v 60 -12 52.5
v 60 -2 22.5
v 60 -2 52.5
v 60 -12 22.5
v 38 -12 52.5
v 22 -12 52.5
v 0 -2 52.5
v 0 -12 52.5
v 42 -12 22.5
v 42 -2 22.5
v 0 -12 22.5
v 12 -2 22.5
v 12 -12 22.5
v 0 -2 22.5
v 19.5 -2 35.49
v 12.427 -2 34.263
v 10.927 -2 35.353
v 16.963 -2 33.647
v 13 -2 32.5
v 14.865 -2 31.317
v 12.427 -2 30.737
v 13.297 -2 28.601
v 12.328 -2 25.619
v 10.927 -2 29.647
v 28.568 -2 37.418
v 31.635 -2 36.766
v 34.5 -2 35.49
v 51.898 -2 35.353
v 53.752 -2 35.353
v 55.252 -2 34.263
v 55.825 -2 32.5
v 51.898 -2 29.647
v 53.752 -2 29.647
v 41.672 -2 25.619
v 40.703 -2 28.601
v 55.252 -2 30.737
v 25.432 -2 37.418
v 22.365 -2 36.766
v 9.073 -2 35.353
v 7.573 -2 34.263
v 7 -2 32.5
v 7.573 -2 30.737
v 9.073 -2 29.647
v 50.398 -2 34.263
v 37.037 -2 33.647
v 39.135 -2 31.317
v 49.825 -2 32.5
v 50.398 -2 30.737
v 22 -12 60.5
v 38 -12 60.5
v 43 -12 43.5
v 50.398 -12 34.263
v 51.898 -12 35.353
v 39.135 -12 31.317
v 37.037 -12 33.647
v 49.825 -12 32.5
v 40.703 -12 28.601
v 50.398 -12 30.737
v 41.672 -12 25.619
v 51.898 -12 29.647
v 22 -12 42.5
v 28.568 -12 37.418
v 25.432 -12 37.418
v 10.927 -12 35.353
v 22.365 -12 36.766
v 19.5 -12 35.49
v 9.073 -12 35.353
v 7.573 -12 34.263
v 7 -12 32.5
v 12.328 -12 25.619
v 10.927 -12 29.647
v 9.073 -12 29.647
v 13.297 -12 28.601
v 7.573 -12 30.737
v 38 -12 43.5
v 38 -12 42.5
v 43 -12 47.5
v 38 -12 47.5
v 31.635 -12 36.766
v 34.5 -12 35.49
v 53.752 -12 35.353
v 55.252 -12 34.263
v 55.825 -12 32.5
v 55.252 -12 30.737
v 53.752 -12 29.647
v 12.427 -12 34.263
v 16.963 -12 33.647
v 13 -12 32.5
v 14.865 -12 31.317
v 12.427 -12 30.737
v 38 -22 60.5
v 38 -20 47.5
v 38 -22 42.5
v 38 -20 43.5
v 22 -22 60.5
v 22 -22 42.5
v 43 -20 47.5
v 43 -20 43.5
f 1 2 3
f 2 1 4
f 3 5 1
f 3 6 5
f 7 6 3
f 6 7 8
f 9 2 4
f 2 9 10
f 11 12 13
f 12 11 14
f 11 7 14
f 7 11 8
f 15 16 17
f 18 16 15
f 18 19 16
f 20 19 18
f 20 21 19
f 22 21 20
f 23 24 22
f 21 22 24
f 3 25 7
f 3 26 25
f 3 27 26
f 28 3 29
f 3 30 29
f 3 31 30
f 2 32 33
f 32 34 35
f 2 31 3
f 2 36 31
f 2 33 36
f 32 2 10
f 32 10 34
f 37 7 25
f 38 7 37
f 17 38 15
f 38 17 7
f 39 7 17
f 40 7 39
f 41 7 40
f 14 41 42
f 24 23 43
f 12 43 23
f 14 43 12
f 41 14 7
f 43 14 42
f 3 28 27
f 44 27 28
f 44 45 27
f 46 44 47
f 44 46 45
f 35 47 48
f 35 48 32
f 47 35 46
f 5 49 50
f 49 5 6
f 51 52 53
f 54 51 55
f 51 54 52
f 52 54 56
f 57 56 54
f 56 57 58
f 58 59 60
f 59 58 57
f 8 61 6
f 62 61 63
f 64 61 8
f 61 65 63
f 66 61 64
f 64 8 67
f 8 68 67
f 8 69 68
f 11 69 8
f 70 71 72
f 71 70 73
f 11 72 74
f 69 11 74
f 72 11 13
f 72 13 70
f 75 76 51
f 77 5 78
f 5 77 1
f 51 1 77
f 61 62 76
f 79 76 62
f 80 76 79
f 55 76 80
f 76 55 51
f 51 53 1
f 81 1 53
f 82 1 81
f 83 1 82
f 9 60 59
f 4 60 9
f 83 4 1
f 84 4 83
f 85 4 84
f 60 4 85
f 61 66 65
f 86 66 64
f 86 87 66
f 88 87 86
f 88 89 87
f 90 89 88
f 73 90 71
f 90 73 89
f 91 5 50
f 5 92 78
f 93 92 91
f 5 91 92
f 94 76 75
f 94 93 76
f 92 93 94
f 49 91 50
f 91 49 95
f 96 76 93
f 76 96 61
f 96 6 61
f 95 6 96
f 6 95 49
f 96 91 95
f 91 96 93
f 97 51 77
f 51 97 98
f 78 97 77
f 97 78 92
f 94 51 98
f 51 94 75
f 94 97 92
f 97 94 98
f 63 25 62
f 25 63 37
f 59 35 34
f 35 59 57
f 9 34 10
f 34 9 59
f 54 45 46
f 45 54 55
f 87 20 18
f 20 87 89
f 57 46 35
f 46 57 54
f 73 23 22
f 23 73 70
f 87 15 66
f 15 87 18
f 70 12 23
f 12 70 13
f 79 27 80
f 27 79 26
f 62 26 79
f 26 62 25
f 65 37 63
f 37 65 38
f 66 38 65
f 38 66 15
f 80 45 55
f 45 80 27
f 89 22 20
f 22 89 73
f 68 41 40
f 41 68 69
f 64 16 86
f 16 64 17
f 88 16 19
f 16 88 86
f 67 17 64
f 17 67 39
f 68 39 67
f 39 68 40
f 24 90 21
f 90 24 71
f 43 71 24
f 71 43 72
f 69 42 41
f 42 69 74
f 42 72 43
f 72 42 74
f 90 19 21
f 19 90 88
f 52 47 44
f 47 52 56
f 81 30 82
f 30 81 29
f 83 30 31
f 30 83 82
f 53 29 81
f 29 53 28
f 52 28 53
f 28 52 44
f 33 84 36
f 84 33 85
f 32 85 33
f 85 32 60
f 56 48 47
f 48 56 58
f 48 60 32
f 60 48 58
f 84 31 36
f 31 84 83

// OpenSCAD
// Smartrap 2.0
// author : serge vieillescaze - smartfriendz
// version 1.9 - 12/09/2014

//variabless
plate_height = 7; // height of all plates
border = 5; // borders around holes for plates
rods_r = 3; // the radius of rods. we use diam 8 but ready to use d=6
M4_bool_r = 2.1; // we can adjust the diam of holes for different printers
bearing_holder_r = 7.5; // the holes for bearings on plates
bearing_holder_l = 24;
space_bet_holders = 10;
filament_r = 0.875; // 1,75  ready for 3mm
nema = 17; // used everywehere to change plate sizes 
linear_system = "fishing_line"; // future option for belt, fishing,printed rail
space_holes_electronics = 84; // adapt to different controlers. 
zrods_spaceX = 72.88;
yrods_spaceY = 62.04;
xrods_spaceX = 42.825;

// ---------  MAIN **************************************

//all();

// testing
//jhead_arm();

//xend_jhead();
translate([0,-12,22.5])
//jhead_arm();

xend_jhead_proxy();


//plate_1();

// draw all
module all(){
	base_center();
	translate([0,-50,0])
	base_y();
	translate([0,-30,45])
	plate_base();
	translate([20,-50,nema_size()[2]])
	plate_y();
	translate([0,50,100])
	plate_x();
	translate([0,0,100])
	xend_jhead();
}


module plate_1(){
	translate([0,0,0]) rotate([-90,0,0])
	xend_jhead();
	translate([90,0,0]) rotate([-90,0,0])
	jhead_arm();

}

// parts  ****************************************************




module bottom()
	difference(){		
		miniround([100,24,plate_height],2);
	translate([10,-10,-1]) 
		cube([80,25,10]); 
	translate([20,20,-1]) 
		cube([nema_size.x,10,10]);
	translate([15,28,4]) rotate([90,0,0])
		cylinder(h=20,r=M4_bool_r);
	translate([65,28,4]) rotate([90,0,0])
		cylinder(h=20,r=M4_bool_r);
	}
		


// plate base   ---------------------------------------------

module plate_base()
	difference(){
	miniround([100,60,plate_height],2);
	
	translate([10,20,(bearing_holder_r*2)-2]) 
	rotate([0,90,0])
		cylinder(h=bearing_holder_l,r=bearing_holder_r);
	translate([bearing_holder_l+space_bet_holders*2,20,(bearing_holder_r*2)-2]) 
	rotate([0,90,0])
		cylinder(h=bearing_holder_l,r=bearing_holder_r);
	}

// plate x  -------------------------------------------------

module plate_x()
	difference(){
		miniround([100,80,plate_height],2);
	translate([20,bearing_holder_l+space_bet_holders,(bearing_holder_r*2)-2]) 
	rotate([90,0,0])
		cylinder(h=bearing_holder_l,r=bearing_holder_r);
	translate([20,(bearing_holder_l+space_bet_holders)*2,(bearing_holder_r*2)-2]) 
	rotate([90,0,0])
		cylinder(h=bearing_holder_l,r=bearing_holder_r);
	translate([70,bearing_holder_l+space_bet_holders,(bearing_holder_r*2)-2]) 
	rotate([90,0,0])
		cylinder(h=bearing_holder_l,r=bearing_holder_r);
	translate([70,(bearing_holder_l+space_bet_holders)*2,(bearing_holder_r*2)-2]) 
	rotate([90,0,0])
		cylinder(h=bearing_holder_l,r=bearing_holder_r);
	}

// plate y --------------------------------------------------

module plate_y()
	difference(){
		miniround([60,40,plate_height],2);
	translate([10,10,(bearing_holder_r*2)-2]) 
	rotate([0,90,0])
		cylinder(h=bearing_holder_l,r=bearing_holder_r);
	translate([44,10,(bearing_holder_r*2)-2]) 
	rotate([0,90,0])
		cylinder(h=bearing_holder_l,r=bearing_holder_r);
	}



// xend - jhead type  ----------------------------------------

xend_width = 60;
xend_pushfit = false;

//xrods_spaceX

module xend_jhead()
	difference(){
		union(){
			cube([xend_width,10,30]); //main
			translate([5,-10,30]) 
				cube([5,20,16]); // switch support
			translate([xend_width,10,30]) rotate([90,0,0])
				cylinder(h=10,r=7); 
		}
			translate([xend_width,11,30])  rotate([90,0,0]) 
					cylinder(h=12,r=1.6);  // hole righ
			translate([xend_width/2-3,11,0])  rotate([90,0,0]) 
					cylinder(h=12,r=15);  // hole middle
			
			translate([10,11,10])  rotate([90,0,0]) 
					cylinder(h=12,r=rods_r); // rods hole
			translate([10+xrods_spaceX,11,10])  rotate([90,0,0]) 
					cylinder(h=12,r=rods_r); // rods hole
			translate([0,-10,30])  rotate([0,90,0]) 
					cylinder(h=12,r=10); // switch support form


	}

// xend_jhead_proxy  : new end with proxymity sensor.

proxy_d = 18;


module xend_jhead_proxy(){
	difference(){
		union(){
			cube([xend_width,10,30]); //main
			
			translate([22,-10,20]) 
				cube([16,10,18]); // head support

			// support top for bowden
			if(!xend_pushfit){
				translate([33,-8,21]) 
				cube([10,8,4]);
			}

			// two middle cyl for head attach
			translate([30,10,10]) rotate([90,0,0])
				cylinder(h=10,r=5); 
			translate([46,10,10]) rotate([90,0,0])
				cylinder(h=10,r=5);
			
			
		}
			
		translate([xend_width/2-3,11,0])  rotate([90,0,0]) 
				cylinder(h=12,r=15);  // hole middle
		
		translate([10,11,10])  rotate([90,0,0]) 
				cylinder(h=12,r=rods_r); // rods hole
		translate([10+xrods_spaceX,11,10])  rotate([90,0,0]) 
				cylinder(h=12,r=rods_r); // rods hole


	}
}


// jhead arm   ----------------------------------------------

jha_height = 7;


module jhead_arm()
	difference(){
		union(){
			cube([xend_width,10,jha_height]); //main
			translate([30,0,jha_height]) 
				cube([16,10,18]); // head support
			translate([xend_width,10,jha_height]) rotate([90,0,0])
				cylinder(h=10,r=7); // right cyl form
			// two middle cyl for head attach
			translate([30,10,10]) rotate([90,0,0])
				cylinder(h=10,r=5); 
			translate([46,10,10]) rotate([90,0,0])
				cylinder(h=10,r=5);
			// support top for bowden
			if(!xend_pushfit){
				translate([33,-8,21]) 
				cube([10,8,4]);
			}
			
				
		}
		// three cyl for main hole vertical . 38 = 30 + 16/2
		union() {
			translate([38,0,-1]) 
				cylinder(h=10.1,r=6);
			translate([38,0,9]) 
				cylinder(h=4.1,r=5);
			translate([38,0,13]) 
				cylinder(h=8,r=6);
		}
		 // cyl + cube for bowden support hole
		union() {
			translate([38,0,20]) 
				cylinder(h=10.1,r=2);
			translate([36,-10,20]) 
			cube([4,10,5.1]);
		}
		translate([xend_width,11,7])  rotate([90,0,0]) 
				cylinder(h=12,r=1.6);  // hole righ
	}

// jhead attach  -------------------------------------------------------

module jhead_attach()
	{

	}


//   xend  back -------------------------------------------------------

module xend_back()
	difference(){
		miniround([100,60,plate_height],2);
	translate([10,-10,-1]) 
		cube([80,25,10]); 
	translate([15,28,4]) rotate([90,0,0])
		cylinder(h=20,r=2.1);
	}

//   yend front-------------------------------------------------------

module yend_front()
	difference(){
		miniround([100,60,plate_height],2);
	translate([10,-10,-1]) 
		cube([80,25,10]); 
	translate([15,28,4]) rotate([90,0,0])
		cylinder(h=20,r=2.1);
	}

//   tend  back -------------------------------------------------------

module yend_back()
	difference(){
		miniround([100,60,plate_height],2);
	translate([10,-10,-1]) 
		cube([80,25,10]); 
	translate([15,28,4]) rotate([90,0,0])
		cylinder(h=20,r=2.1);
	}



module bearingsholder_x()
	difference(){
		miniround([100,60,plate_height],2);
	translate([10,-10,-1]) 
		cube([80,25,10]); 
	translate([15,28,4]) rotate([90,0,0])
		cylinder(h=20,r=2.1);
	}

module bearingsholder_base_front()
	difference(){
		miniround([100,60,plate_height],2);
	translate([10,-10,-1]) 
		cube([80,25,10]); 
	translate([15,28,4]) rotate([90,0,0])
		cylinder(h=20,r=2.1);
	}

module bearingsholder_base_back()
	difference(){
		miniround([100,60,plate_height],2);
	translate([10,-10,-1]) 
		cube([80,25,10]); 
	translate([15,28,4]) rotate([90,0,0])
		cylinder(h=20,r=2.1);
	}

module fishingline_tensioner()
	difference(){
		miniround([100,60,plate_height],2);
	translate([10,-10,-1]) 
		cube([80,25,10]); 
	translate([15,28,4]) rotate([90,0,0])
		cylinder(h=20,r=2.1);
	}





// lib -----------------------------

module miniround(size, radius)
{
$fn=6;
x = size[0]-radius/2;
y = size[1]-radius/2;

minkowski()
{
cube(size=[x,y,size[2]]);
cylinder(r=radius);
// Using a sphere is possible, but will kill performance
//sphere(r=radius);
}
}

module nema_bool()
{
 if(nema==17){
	
	union(){
		cube(42);
		translate([21,21,40])
		//rotate([0,90,0])
		cylinder(r=11,h=20);
		translate([5.5,5.5,40]) cylinder(r=1.6,h=20);
		translate([36.5,5.5,40]) cylinder(r=1.6,h=20);
		translate([5.5,36.5,40]) cylinder(r=1.6,h=20);
		translate([36.5,36.5,40]) cylinder(r=1.6,h=20);
		}
 }
 if(nema==14){
 cube(35);
 }
}

function nema_size()= (nema==17) ? [42,42,42] : [35,35,35];


module zrod(){
	//rotate([90,0,0])
	cylinder(r=rods_r,h=150);
}
